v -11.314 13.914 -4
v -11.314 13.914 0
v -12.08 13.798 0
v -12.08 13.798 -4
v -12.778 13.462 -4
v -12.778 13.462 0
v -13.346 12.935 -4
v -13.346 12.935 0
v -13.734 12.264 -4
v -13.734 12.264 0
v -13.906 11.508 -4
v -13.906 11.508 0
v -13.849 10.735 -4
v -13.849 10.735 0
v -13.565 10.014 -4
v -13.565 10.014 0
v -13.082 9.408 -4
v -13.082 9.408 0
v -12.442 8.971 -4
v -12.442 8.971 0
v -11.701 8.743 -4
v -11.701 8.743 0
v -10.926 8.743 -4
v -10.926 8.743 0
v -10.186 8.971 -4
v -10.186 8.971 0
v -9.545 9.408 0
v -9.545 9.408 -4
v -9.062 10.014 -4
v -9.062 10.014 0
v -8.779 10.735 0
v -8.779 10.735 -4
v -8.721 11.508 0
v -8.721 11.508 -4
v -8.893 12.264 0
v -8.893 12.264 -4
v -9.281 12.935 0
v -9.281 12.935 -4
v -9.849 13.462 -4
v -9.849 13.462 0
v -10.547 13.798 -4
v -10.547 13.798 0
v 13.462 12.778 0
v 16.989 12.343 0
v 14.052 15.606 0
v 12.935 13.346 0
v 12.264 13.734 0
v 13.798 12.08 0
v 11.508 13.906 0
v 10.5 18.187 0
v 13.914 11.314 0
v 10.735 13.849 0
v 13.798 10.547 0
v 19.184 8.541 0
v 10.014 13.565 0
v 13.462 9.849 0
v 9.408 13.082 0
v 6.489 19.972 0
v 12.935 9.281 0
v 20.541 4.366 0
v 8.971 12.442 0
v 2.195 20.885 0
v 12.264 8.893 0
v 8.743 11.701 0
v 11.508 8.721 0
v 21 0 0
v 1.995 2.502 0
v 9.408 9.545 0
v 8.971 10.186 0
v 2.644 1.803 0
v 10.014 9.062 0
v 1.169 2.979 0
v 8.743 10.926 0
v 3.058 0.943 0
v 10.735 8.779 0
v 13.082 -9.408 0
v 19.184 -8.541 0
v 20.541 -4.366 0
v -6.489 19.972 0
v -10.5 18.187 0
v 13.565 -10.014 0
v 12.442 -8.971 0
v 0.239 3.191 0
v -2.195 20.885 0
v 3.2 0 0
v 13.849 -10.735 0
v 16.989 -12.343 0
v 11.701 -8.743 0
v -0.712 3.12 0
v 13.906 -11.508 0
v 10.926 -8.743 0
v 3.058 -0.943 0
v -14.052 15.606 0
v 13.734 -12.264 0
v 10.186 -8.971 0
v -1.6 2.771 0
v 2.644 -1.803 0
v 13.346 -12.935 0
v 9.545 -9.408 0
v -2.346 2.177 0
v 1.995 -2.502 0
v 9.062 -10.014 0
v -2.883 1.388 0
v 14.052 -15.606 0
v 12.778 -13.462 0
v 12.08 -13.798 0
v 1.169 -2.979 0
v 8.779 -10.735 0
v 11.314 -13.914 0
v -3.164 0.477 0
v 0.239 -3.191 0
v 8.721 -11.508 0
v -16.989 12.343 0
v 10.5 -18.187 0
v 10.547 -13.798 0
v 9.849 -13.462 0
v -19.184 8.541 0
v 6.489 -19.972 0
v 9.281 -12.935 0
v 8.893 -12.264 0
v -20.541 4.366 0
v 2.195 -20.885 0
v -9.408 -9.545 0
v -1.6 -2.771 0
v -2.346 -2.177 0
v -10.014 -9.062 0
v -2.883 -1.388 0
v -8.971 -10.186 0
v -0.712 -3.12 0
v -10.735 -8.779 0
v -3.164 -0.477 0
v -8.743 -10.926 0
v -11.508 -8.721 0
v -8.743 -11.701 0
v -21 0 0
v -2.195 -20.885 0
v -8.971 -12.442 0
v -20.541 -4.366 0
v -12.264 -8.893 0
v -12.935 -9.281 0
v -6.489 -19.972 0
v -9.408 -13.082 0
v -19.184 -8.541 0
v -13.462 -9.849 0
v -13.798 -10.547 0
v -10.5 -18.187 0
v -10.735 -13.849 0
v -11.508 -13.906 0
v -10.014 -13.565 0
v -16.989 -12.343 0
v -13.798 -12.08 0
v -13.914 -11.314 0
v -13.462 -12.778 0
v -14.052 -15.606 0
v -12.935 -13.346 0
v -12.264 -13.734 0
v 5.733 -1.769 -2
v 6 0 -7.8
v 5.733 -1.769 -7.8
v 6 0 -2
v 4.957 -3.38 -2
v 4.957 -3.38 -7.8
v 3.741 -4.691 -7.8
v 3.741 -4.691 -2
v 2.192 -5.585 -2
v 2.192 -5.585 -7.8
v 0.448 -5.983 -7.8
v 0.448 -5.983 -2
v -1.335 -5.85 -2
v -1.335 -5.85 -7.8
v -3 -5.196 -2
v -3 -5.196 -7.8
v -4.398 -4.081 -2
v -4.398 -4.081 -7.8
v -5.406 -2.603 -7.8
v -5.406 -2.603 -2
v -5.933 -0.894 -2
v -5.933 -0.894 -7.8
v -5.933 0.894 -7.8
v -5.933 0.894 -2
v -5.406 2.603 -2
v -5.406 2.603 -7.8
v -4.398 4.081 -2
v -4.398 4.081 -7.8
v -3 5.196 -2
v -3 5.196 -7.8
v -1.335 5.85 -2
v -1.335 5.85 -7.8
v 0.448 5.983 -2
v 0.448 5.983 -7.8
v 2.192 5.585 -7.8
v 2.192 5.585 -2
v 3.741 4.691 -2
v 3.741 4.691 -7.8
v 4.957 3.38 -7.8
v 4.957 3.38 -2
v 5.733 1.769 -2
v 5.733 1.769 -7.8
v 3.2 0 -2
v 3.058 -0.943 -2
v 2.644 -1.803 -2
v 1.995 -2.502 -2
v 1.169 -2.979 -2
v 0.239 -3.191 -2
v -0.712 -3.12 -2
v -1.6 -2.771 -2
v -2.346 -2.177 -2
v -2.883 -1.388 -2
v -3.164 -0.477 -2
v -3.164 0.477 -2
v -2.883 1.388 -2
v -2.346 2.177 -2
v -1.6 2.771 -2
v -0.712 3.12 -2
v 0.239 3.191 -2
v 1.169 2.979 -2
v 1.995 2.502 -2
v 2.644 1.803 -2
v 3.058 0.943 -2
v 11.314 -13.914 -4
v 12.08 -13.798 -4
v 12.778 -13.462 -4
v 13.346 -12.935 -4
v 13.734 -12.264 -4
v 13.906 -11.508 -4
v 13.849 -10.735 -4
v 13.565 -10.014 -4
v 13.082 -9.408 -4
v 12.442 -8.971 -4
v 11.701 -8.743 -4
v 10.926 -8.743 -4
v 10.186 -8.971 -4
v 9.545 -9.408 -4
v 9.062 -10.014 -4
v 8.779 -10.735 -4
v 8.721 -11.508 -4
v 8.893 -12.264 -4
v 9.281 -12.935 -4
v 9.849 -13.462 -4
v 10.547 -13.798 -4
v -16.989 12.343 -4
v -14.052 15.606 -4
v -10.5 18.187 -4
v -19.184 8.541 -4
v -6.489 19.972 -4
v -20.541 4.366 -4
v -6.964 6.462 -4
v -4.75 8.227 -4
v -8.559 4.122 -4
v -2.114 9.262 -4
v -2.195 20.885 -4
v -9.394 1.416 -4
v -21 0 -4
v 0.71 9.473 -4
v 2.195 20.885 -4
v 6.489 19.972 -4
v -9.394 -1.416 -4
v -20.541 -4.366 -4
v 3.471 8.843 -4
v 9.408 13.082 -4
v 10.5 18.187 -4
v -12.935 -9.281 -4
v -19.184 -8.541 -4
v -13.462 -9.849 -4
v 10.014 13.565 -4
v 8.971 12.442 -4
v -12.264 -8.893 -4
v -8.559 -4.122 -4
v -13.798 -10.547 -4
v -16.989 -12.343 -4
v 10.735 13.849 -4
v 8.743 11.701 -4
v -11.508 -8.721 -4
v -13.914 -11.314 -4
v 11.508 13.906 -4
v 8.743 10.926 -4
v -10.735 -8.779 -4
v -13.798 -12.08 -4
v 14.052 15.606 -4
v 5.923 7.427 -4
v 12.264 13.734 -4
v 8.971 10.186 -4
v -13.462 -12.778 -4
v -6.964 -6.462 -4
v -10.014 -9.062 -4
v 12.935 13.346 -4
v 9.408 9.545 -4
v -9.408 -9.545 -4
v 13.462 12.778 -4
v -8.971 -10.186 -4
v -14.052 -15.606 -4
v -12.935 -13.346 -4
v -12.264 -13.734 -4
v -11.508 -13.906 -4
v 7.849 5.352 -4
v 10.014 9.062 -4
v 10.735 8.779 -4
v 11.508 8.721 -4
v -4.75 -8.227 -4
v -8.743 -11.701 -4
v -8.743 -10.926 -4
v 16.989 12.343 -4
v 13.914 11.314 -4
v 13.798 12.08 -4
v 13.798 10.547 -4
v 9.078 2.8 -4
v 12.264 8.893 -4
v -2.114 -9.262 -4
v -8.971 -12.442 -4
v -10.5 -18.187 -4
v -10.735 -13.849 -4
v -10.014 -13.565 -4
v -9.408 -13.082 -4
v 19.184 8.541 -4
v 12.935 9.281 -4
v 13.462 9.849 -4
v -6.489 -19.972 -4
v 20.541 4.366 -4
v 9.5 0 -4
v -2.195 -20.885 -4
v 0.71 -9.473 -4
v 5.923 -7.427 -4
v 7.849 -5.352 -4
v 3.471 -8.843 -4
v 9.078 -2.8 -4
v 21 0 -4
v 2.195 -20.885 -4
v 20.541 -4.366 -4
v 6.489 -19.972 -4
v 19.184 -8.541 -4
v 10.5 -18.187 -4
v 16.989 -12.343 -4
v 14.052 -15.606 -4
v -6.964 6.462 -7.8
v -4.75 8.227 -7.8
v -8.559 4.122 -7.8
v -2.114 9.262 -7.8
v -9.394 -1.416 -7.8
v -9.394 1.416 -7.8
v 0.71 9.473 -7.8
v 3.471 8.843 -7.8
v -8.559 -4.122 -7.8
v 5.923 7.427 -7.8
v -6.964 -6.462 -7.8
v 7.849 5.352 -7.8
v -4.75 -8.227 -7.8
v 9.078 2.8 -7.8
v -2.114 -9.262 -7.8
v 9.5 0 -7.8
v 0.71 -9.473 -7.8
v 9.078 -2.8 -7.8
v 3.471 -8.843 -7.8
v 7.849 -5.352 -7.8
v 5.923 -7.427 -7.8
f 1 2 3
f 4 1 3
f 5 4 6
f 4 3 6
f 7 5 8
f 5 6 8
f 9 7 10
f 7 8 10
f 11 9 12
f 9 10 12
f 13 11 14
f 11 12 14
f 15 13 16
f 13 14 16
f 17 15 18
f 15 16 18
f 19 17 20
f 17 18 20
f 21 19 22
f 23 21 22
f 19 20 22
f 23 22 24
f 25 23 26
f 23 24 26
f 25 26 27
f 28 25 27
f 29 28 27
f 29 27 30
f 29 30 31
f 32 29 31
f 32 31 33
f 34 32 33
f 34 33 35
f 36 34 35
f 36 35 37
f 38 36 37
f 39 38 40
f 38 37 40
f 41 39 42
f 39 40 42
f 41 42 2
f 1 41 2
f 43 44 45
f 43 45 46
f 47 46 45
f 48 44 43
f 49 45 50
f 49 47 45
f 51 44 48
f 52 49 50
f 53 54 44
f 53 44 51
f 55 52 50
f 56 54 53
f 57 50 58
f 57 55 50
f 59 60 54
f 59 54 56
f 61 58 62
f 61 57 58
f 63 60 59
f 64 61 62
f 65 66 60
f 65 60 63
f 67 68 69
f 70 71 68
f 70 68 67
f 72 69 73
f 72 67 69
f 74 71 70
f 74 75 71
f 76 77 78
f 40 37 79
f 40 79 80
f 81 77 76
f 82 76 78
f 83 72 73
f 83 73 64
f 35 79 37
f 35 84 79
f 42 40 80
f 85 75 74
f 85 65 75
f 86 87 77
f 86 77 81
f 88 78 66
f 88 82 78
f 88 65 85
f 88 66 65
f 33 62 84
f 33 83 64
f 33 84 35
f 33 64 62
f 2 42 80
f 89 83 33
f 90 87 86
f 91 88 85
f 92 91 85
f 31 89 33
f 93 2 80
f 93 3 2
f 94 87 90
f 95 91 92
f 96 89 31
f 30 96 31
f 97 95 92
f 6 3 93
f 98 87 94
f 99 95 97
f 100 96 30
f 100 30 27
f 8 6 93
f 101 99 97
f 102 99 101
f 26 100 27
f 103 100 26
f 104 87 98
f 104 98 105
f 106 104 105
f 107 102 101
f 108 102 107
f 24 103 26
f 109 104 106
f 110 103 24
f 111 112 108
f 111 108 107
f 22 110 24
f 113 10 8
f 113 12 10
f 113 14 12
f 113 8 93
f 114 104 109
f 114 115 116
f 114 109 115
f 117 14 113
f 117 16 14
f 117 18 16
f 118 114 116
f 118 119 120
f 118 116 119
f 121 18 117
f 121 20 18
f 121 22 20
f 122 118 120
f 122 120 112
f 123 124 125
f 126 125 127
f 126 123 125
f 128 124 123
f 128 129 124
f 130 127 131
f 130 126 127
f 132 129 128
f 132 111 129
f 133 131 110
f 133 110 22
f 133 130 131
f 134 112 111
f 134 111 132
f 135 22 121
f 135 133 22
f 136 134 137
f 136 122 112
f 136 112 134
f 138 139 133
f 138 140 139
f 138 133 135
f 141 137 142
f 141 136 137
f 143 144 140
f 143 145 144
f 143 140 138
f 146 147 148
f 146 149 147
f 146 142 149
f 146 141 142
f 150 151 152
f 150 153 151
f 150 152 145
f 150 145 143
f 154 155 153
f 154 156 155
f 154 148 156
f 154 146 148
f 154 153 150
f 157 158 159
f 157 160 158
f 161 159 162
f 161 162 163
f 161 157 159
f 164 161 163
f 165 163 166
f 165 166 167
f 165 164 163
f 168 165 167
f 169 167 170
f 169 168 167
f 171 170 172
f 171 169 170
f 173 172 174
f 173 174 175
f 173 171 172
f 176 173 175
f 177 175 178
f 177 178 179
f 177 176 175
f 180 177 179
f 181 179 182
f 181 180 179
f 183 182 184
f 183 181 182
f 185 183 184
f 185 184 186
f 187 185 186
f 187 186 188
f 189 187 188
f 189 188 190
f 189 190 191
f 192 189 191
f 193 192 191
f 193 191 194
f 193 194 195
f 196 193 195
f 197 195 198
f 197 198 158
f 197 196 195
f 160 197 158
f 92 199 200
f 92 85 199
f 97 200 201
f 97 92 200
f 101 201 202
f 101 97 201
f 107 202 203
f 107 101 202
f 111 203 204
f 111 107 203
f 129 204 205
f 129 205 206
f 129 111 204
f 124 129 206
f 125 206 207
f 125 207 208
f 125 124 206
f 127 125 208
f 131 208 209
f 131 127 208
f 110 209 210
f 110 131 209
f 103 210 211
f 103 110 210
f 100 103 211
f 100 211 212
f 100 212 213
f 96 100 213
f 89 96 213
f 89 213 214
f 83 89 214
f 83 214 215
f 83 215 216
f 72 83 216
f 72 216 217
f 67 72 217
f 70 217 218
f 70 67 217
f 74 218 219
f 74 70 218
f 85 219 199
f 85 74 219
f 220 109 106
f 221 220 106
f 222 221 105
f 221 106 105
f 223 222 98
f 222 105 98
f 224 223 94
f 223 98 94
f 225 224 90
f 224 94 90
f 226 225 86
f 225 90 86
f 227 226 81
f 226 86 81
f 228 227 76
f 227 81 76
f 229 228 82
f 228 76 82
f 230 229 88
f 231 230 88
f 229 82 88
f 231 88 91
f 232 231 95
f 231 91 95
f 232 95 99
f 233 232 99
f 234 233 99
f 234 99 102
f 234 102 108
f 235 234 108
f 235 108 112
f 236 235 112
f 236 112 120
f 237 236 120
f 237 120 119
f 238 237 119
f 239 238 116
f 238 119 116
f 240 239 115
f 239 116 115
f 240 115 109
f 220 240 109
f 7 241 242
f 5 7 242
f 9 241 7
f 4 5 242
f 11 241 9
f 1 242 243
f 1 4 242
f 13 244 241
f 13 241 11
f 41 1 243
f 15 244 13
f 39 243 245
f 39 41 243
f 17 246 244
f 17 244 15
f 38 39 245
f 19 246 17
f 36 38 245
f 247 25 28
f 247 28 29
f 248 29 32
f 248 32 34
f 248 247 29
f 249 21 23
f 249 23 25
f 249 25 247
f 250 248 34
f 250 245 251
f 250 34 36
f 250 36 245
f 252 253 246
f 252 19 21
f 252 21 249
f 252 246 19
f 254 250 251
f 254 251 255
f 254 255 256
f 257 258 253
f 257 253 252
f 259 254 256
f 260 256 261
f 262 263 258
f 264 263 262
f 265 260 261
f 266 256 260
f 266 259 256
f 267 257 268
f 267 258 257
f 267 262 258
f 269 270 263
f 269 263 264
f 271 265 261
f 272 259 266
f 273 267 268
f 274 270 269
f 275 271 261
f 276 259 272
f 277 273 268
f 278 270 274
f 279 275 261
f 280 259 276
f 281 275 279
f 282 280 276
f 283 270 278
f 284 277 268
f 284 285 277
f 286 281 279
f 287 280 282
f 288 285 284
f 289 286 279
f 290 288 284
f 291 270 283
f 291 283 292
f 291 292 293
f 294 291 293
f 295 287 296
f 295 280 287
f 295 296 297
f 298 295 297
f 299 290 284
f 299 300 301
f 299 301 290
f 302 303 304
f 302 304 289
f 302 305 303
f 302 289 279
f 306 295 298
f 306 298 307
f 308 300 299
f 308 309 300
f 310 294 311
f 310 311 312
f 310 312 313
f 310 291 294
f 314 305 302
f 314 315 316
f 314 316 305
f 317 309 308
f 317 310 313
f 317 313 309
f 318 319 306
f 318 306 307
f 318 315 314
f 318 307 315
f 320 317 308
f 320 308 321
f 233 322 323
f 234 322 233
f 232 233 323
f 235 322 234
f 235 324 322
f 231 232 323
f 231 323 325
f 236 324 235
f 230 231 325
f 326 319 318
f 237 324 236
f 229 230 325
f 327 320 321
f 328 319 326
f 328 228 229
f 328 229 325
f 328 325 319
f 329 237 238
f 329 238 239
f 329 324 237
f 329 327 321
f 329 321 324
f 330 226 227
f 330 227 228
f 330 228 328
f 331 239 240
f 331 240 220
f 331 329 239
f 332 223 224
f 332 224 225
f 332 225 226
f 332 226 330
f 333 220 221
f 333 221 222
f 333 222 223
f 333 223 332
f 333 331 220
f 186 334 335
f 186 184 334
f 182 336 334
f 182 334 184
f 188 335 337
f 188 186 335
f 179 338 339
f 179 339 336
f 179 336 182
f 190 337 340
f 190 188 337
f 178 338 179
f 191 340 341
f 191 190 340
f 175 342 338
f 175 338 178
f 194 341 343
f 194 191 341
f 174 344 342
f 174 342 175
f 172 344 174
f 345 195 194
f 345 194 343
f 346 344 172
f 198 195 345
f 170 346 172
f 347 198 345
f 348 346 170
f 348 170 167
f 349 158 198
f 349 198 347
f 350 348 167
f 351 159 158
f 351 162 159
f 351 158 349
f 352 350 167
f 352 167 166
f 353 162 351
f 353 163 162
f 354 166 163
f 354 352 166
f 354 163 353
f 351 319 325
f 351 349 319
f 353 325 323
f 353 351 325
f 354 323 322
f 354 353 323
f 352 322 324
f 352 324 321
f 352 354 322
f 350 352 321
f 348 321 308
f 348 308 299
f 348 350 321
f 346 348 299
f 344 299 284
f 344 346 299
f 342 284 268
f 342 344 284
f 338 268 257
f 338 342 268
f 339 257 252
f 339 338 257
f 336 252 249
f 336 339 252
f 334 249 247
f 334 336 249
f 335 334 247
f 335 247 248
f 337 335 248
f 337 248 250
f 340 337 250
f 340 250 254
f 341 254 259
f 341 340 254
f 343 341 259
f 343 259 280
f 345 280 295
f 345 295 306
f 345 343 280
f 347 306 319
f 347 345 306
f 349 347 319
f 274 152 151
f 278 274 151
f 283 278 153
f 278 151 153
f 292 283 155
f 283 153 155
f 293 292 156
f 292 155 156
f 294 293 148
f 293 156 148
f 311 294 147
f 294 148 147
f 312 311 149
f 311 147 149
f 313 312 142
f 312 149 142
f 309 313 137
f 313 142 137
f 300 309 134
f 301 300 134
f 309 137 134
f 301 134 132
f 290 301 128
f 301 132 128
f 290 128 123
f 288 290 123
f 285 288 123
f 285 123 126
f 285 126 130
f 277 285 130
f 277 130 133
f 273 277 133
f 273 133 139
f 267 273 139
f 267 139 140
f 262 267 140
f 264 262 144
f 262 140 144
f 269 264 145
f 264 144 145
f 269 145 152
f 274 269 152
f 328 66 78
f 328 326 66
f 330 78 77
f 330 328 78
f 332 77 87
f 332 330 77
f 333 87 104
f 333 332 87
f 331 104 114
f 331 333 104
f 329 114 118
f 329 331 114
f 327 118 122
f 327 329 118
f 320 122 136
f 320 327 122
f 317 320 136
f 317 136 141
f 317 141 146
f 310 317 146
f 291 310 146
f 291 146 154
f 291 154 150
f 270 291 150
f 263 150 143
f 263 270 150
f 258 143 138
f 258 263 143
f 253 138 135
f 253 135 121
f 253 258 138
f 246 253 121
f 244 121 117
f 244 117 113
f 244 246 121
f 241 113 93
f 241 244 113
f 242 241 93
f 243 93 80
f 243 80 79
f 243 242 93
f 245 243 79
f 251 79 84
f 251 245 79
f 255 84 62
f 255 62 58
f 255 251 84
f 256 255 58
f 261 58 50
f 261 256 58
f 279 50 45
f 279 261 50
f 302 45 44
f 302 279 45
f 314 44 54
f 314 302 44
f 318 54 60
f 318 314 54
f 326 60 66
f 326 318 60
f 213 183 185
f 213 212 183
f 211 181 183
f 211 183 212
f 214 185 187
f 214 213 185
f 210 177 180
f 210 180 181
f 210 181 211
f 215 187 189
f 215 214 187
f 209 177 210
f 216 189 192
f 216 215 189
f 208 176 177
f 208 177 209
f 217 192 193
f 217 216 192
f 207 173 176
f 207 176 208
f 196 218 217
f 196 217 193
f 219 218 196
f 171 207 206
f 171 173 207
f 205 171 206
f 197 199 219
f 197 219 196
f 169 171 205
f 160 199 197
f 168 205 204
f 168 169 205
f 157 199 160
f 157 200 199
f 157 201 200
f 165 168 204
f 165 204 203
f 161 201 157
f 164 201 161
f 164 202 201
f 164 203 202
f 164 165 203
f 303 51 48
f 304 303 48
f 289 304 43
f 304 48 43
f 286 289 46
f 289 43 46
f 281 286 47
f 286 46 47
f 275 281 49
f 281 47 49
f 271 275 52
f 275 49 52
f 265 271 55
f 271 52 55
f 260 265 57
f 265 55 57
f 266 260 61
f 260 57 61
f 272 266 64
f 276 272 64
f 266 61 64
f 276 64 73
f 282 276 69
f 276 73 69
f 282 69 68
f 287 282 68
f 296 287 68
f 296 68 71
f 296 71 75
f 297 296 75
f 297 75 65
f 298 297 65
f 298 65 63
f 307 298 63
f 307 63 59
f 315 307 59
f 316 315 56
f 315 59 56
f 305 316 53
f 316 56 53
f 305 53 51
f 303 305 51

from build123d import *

# Parameters (mm, degrees)
SKETCH_2_R               = 2.6
CUT_EXTRUDE_1_DEPTH      = 4
PATTERN_CIRCULAR_1_COUNT = 4


with BuildPart() as part:
    # Эскиз1 → Повернуть1 (revolve)
    with BuildSketch(Plane(origin=(0, 0, 0), x_dir=(1, 0, 0), z_dir=(0, 1, 0)), mode=Mode.PRIVATE) as revolve_1_sk:
        Polygon((-3.2, 0), (-21, 0), (-21, 4), (-9.5, 4), (-9.5, 7.8), (-6, 7.8), (-6, 2), (-3.2, 2), align=None)
    revolve(revolve_1_sk.sketch.rotate(Axis((0, 0, 0), (0, 0, -1)), 180), axis=Axis((0, 0, 0), (0, 0, -1)))

    # Эскиз2 → Вырез-Вытянуть1 (cut)
    with BuildSketch(Plane.XY):
        with Locations((11.313708499, 11.313708499)):
            Circle(SKETCH_2_R)
    cut_extrude_1 = extrude(amount=-CUT_EXTRUDE_1_DEPTH, mode=Mode.SUBTRACT)

    # Круговой массив1: Вырез-Вытянуть1 ×4 about axis
    pattern_circular_1_axis = Axis((0, 0, 0), (0, 0, 1))
    for i in range(1, PATTERN_CIRCULAR_1_COUNT):
        add(cut_extrude_1.rotate(pattern_circular_1_axis, i * 360 / PATTERN_CIRCULAR_1_COUNT), mode=Mode.SUBTRACT)


solid = part.part
